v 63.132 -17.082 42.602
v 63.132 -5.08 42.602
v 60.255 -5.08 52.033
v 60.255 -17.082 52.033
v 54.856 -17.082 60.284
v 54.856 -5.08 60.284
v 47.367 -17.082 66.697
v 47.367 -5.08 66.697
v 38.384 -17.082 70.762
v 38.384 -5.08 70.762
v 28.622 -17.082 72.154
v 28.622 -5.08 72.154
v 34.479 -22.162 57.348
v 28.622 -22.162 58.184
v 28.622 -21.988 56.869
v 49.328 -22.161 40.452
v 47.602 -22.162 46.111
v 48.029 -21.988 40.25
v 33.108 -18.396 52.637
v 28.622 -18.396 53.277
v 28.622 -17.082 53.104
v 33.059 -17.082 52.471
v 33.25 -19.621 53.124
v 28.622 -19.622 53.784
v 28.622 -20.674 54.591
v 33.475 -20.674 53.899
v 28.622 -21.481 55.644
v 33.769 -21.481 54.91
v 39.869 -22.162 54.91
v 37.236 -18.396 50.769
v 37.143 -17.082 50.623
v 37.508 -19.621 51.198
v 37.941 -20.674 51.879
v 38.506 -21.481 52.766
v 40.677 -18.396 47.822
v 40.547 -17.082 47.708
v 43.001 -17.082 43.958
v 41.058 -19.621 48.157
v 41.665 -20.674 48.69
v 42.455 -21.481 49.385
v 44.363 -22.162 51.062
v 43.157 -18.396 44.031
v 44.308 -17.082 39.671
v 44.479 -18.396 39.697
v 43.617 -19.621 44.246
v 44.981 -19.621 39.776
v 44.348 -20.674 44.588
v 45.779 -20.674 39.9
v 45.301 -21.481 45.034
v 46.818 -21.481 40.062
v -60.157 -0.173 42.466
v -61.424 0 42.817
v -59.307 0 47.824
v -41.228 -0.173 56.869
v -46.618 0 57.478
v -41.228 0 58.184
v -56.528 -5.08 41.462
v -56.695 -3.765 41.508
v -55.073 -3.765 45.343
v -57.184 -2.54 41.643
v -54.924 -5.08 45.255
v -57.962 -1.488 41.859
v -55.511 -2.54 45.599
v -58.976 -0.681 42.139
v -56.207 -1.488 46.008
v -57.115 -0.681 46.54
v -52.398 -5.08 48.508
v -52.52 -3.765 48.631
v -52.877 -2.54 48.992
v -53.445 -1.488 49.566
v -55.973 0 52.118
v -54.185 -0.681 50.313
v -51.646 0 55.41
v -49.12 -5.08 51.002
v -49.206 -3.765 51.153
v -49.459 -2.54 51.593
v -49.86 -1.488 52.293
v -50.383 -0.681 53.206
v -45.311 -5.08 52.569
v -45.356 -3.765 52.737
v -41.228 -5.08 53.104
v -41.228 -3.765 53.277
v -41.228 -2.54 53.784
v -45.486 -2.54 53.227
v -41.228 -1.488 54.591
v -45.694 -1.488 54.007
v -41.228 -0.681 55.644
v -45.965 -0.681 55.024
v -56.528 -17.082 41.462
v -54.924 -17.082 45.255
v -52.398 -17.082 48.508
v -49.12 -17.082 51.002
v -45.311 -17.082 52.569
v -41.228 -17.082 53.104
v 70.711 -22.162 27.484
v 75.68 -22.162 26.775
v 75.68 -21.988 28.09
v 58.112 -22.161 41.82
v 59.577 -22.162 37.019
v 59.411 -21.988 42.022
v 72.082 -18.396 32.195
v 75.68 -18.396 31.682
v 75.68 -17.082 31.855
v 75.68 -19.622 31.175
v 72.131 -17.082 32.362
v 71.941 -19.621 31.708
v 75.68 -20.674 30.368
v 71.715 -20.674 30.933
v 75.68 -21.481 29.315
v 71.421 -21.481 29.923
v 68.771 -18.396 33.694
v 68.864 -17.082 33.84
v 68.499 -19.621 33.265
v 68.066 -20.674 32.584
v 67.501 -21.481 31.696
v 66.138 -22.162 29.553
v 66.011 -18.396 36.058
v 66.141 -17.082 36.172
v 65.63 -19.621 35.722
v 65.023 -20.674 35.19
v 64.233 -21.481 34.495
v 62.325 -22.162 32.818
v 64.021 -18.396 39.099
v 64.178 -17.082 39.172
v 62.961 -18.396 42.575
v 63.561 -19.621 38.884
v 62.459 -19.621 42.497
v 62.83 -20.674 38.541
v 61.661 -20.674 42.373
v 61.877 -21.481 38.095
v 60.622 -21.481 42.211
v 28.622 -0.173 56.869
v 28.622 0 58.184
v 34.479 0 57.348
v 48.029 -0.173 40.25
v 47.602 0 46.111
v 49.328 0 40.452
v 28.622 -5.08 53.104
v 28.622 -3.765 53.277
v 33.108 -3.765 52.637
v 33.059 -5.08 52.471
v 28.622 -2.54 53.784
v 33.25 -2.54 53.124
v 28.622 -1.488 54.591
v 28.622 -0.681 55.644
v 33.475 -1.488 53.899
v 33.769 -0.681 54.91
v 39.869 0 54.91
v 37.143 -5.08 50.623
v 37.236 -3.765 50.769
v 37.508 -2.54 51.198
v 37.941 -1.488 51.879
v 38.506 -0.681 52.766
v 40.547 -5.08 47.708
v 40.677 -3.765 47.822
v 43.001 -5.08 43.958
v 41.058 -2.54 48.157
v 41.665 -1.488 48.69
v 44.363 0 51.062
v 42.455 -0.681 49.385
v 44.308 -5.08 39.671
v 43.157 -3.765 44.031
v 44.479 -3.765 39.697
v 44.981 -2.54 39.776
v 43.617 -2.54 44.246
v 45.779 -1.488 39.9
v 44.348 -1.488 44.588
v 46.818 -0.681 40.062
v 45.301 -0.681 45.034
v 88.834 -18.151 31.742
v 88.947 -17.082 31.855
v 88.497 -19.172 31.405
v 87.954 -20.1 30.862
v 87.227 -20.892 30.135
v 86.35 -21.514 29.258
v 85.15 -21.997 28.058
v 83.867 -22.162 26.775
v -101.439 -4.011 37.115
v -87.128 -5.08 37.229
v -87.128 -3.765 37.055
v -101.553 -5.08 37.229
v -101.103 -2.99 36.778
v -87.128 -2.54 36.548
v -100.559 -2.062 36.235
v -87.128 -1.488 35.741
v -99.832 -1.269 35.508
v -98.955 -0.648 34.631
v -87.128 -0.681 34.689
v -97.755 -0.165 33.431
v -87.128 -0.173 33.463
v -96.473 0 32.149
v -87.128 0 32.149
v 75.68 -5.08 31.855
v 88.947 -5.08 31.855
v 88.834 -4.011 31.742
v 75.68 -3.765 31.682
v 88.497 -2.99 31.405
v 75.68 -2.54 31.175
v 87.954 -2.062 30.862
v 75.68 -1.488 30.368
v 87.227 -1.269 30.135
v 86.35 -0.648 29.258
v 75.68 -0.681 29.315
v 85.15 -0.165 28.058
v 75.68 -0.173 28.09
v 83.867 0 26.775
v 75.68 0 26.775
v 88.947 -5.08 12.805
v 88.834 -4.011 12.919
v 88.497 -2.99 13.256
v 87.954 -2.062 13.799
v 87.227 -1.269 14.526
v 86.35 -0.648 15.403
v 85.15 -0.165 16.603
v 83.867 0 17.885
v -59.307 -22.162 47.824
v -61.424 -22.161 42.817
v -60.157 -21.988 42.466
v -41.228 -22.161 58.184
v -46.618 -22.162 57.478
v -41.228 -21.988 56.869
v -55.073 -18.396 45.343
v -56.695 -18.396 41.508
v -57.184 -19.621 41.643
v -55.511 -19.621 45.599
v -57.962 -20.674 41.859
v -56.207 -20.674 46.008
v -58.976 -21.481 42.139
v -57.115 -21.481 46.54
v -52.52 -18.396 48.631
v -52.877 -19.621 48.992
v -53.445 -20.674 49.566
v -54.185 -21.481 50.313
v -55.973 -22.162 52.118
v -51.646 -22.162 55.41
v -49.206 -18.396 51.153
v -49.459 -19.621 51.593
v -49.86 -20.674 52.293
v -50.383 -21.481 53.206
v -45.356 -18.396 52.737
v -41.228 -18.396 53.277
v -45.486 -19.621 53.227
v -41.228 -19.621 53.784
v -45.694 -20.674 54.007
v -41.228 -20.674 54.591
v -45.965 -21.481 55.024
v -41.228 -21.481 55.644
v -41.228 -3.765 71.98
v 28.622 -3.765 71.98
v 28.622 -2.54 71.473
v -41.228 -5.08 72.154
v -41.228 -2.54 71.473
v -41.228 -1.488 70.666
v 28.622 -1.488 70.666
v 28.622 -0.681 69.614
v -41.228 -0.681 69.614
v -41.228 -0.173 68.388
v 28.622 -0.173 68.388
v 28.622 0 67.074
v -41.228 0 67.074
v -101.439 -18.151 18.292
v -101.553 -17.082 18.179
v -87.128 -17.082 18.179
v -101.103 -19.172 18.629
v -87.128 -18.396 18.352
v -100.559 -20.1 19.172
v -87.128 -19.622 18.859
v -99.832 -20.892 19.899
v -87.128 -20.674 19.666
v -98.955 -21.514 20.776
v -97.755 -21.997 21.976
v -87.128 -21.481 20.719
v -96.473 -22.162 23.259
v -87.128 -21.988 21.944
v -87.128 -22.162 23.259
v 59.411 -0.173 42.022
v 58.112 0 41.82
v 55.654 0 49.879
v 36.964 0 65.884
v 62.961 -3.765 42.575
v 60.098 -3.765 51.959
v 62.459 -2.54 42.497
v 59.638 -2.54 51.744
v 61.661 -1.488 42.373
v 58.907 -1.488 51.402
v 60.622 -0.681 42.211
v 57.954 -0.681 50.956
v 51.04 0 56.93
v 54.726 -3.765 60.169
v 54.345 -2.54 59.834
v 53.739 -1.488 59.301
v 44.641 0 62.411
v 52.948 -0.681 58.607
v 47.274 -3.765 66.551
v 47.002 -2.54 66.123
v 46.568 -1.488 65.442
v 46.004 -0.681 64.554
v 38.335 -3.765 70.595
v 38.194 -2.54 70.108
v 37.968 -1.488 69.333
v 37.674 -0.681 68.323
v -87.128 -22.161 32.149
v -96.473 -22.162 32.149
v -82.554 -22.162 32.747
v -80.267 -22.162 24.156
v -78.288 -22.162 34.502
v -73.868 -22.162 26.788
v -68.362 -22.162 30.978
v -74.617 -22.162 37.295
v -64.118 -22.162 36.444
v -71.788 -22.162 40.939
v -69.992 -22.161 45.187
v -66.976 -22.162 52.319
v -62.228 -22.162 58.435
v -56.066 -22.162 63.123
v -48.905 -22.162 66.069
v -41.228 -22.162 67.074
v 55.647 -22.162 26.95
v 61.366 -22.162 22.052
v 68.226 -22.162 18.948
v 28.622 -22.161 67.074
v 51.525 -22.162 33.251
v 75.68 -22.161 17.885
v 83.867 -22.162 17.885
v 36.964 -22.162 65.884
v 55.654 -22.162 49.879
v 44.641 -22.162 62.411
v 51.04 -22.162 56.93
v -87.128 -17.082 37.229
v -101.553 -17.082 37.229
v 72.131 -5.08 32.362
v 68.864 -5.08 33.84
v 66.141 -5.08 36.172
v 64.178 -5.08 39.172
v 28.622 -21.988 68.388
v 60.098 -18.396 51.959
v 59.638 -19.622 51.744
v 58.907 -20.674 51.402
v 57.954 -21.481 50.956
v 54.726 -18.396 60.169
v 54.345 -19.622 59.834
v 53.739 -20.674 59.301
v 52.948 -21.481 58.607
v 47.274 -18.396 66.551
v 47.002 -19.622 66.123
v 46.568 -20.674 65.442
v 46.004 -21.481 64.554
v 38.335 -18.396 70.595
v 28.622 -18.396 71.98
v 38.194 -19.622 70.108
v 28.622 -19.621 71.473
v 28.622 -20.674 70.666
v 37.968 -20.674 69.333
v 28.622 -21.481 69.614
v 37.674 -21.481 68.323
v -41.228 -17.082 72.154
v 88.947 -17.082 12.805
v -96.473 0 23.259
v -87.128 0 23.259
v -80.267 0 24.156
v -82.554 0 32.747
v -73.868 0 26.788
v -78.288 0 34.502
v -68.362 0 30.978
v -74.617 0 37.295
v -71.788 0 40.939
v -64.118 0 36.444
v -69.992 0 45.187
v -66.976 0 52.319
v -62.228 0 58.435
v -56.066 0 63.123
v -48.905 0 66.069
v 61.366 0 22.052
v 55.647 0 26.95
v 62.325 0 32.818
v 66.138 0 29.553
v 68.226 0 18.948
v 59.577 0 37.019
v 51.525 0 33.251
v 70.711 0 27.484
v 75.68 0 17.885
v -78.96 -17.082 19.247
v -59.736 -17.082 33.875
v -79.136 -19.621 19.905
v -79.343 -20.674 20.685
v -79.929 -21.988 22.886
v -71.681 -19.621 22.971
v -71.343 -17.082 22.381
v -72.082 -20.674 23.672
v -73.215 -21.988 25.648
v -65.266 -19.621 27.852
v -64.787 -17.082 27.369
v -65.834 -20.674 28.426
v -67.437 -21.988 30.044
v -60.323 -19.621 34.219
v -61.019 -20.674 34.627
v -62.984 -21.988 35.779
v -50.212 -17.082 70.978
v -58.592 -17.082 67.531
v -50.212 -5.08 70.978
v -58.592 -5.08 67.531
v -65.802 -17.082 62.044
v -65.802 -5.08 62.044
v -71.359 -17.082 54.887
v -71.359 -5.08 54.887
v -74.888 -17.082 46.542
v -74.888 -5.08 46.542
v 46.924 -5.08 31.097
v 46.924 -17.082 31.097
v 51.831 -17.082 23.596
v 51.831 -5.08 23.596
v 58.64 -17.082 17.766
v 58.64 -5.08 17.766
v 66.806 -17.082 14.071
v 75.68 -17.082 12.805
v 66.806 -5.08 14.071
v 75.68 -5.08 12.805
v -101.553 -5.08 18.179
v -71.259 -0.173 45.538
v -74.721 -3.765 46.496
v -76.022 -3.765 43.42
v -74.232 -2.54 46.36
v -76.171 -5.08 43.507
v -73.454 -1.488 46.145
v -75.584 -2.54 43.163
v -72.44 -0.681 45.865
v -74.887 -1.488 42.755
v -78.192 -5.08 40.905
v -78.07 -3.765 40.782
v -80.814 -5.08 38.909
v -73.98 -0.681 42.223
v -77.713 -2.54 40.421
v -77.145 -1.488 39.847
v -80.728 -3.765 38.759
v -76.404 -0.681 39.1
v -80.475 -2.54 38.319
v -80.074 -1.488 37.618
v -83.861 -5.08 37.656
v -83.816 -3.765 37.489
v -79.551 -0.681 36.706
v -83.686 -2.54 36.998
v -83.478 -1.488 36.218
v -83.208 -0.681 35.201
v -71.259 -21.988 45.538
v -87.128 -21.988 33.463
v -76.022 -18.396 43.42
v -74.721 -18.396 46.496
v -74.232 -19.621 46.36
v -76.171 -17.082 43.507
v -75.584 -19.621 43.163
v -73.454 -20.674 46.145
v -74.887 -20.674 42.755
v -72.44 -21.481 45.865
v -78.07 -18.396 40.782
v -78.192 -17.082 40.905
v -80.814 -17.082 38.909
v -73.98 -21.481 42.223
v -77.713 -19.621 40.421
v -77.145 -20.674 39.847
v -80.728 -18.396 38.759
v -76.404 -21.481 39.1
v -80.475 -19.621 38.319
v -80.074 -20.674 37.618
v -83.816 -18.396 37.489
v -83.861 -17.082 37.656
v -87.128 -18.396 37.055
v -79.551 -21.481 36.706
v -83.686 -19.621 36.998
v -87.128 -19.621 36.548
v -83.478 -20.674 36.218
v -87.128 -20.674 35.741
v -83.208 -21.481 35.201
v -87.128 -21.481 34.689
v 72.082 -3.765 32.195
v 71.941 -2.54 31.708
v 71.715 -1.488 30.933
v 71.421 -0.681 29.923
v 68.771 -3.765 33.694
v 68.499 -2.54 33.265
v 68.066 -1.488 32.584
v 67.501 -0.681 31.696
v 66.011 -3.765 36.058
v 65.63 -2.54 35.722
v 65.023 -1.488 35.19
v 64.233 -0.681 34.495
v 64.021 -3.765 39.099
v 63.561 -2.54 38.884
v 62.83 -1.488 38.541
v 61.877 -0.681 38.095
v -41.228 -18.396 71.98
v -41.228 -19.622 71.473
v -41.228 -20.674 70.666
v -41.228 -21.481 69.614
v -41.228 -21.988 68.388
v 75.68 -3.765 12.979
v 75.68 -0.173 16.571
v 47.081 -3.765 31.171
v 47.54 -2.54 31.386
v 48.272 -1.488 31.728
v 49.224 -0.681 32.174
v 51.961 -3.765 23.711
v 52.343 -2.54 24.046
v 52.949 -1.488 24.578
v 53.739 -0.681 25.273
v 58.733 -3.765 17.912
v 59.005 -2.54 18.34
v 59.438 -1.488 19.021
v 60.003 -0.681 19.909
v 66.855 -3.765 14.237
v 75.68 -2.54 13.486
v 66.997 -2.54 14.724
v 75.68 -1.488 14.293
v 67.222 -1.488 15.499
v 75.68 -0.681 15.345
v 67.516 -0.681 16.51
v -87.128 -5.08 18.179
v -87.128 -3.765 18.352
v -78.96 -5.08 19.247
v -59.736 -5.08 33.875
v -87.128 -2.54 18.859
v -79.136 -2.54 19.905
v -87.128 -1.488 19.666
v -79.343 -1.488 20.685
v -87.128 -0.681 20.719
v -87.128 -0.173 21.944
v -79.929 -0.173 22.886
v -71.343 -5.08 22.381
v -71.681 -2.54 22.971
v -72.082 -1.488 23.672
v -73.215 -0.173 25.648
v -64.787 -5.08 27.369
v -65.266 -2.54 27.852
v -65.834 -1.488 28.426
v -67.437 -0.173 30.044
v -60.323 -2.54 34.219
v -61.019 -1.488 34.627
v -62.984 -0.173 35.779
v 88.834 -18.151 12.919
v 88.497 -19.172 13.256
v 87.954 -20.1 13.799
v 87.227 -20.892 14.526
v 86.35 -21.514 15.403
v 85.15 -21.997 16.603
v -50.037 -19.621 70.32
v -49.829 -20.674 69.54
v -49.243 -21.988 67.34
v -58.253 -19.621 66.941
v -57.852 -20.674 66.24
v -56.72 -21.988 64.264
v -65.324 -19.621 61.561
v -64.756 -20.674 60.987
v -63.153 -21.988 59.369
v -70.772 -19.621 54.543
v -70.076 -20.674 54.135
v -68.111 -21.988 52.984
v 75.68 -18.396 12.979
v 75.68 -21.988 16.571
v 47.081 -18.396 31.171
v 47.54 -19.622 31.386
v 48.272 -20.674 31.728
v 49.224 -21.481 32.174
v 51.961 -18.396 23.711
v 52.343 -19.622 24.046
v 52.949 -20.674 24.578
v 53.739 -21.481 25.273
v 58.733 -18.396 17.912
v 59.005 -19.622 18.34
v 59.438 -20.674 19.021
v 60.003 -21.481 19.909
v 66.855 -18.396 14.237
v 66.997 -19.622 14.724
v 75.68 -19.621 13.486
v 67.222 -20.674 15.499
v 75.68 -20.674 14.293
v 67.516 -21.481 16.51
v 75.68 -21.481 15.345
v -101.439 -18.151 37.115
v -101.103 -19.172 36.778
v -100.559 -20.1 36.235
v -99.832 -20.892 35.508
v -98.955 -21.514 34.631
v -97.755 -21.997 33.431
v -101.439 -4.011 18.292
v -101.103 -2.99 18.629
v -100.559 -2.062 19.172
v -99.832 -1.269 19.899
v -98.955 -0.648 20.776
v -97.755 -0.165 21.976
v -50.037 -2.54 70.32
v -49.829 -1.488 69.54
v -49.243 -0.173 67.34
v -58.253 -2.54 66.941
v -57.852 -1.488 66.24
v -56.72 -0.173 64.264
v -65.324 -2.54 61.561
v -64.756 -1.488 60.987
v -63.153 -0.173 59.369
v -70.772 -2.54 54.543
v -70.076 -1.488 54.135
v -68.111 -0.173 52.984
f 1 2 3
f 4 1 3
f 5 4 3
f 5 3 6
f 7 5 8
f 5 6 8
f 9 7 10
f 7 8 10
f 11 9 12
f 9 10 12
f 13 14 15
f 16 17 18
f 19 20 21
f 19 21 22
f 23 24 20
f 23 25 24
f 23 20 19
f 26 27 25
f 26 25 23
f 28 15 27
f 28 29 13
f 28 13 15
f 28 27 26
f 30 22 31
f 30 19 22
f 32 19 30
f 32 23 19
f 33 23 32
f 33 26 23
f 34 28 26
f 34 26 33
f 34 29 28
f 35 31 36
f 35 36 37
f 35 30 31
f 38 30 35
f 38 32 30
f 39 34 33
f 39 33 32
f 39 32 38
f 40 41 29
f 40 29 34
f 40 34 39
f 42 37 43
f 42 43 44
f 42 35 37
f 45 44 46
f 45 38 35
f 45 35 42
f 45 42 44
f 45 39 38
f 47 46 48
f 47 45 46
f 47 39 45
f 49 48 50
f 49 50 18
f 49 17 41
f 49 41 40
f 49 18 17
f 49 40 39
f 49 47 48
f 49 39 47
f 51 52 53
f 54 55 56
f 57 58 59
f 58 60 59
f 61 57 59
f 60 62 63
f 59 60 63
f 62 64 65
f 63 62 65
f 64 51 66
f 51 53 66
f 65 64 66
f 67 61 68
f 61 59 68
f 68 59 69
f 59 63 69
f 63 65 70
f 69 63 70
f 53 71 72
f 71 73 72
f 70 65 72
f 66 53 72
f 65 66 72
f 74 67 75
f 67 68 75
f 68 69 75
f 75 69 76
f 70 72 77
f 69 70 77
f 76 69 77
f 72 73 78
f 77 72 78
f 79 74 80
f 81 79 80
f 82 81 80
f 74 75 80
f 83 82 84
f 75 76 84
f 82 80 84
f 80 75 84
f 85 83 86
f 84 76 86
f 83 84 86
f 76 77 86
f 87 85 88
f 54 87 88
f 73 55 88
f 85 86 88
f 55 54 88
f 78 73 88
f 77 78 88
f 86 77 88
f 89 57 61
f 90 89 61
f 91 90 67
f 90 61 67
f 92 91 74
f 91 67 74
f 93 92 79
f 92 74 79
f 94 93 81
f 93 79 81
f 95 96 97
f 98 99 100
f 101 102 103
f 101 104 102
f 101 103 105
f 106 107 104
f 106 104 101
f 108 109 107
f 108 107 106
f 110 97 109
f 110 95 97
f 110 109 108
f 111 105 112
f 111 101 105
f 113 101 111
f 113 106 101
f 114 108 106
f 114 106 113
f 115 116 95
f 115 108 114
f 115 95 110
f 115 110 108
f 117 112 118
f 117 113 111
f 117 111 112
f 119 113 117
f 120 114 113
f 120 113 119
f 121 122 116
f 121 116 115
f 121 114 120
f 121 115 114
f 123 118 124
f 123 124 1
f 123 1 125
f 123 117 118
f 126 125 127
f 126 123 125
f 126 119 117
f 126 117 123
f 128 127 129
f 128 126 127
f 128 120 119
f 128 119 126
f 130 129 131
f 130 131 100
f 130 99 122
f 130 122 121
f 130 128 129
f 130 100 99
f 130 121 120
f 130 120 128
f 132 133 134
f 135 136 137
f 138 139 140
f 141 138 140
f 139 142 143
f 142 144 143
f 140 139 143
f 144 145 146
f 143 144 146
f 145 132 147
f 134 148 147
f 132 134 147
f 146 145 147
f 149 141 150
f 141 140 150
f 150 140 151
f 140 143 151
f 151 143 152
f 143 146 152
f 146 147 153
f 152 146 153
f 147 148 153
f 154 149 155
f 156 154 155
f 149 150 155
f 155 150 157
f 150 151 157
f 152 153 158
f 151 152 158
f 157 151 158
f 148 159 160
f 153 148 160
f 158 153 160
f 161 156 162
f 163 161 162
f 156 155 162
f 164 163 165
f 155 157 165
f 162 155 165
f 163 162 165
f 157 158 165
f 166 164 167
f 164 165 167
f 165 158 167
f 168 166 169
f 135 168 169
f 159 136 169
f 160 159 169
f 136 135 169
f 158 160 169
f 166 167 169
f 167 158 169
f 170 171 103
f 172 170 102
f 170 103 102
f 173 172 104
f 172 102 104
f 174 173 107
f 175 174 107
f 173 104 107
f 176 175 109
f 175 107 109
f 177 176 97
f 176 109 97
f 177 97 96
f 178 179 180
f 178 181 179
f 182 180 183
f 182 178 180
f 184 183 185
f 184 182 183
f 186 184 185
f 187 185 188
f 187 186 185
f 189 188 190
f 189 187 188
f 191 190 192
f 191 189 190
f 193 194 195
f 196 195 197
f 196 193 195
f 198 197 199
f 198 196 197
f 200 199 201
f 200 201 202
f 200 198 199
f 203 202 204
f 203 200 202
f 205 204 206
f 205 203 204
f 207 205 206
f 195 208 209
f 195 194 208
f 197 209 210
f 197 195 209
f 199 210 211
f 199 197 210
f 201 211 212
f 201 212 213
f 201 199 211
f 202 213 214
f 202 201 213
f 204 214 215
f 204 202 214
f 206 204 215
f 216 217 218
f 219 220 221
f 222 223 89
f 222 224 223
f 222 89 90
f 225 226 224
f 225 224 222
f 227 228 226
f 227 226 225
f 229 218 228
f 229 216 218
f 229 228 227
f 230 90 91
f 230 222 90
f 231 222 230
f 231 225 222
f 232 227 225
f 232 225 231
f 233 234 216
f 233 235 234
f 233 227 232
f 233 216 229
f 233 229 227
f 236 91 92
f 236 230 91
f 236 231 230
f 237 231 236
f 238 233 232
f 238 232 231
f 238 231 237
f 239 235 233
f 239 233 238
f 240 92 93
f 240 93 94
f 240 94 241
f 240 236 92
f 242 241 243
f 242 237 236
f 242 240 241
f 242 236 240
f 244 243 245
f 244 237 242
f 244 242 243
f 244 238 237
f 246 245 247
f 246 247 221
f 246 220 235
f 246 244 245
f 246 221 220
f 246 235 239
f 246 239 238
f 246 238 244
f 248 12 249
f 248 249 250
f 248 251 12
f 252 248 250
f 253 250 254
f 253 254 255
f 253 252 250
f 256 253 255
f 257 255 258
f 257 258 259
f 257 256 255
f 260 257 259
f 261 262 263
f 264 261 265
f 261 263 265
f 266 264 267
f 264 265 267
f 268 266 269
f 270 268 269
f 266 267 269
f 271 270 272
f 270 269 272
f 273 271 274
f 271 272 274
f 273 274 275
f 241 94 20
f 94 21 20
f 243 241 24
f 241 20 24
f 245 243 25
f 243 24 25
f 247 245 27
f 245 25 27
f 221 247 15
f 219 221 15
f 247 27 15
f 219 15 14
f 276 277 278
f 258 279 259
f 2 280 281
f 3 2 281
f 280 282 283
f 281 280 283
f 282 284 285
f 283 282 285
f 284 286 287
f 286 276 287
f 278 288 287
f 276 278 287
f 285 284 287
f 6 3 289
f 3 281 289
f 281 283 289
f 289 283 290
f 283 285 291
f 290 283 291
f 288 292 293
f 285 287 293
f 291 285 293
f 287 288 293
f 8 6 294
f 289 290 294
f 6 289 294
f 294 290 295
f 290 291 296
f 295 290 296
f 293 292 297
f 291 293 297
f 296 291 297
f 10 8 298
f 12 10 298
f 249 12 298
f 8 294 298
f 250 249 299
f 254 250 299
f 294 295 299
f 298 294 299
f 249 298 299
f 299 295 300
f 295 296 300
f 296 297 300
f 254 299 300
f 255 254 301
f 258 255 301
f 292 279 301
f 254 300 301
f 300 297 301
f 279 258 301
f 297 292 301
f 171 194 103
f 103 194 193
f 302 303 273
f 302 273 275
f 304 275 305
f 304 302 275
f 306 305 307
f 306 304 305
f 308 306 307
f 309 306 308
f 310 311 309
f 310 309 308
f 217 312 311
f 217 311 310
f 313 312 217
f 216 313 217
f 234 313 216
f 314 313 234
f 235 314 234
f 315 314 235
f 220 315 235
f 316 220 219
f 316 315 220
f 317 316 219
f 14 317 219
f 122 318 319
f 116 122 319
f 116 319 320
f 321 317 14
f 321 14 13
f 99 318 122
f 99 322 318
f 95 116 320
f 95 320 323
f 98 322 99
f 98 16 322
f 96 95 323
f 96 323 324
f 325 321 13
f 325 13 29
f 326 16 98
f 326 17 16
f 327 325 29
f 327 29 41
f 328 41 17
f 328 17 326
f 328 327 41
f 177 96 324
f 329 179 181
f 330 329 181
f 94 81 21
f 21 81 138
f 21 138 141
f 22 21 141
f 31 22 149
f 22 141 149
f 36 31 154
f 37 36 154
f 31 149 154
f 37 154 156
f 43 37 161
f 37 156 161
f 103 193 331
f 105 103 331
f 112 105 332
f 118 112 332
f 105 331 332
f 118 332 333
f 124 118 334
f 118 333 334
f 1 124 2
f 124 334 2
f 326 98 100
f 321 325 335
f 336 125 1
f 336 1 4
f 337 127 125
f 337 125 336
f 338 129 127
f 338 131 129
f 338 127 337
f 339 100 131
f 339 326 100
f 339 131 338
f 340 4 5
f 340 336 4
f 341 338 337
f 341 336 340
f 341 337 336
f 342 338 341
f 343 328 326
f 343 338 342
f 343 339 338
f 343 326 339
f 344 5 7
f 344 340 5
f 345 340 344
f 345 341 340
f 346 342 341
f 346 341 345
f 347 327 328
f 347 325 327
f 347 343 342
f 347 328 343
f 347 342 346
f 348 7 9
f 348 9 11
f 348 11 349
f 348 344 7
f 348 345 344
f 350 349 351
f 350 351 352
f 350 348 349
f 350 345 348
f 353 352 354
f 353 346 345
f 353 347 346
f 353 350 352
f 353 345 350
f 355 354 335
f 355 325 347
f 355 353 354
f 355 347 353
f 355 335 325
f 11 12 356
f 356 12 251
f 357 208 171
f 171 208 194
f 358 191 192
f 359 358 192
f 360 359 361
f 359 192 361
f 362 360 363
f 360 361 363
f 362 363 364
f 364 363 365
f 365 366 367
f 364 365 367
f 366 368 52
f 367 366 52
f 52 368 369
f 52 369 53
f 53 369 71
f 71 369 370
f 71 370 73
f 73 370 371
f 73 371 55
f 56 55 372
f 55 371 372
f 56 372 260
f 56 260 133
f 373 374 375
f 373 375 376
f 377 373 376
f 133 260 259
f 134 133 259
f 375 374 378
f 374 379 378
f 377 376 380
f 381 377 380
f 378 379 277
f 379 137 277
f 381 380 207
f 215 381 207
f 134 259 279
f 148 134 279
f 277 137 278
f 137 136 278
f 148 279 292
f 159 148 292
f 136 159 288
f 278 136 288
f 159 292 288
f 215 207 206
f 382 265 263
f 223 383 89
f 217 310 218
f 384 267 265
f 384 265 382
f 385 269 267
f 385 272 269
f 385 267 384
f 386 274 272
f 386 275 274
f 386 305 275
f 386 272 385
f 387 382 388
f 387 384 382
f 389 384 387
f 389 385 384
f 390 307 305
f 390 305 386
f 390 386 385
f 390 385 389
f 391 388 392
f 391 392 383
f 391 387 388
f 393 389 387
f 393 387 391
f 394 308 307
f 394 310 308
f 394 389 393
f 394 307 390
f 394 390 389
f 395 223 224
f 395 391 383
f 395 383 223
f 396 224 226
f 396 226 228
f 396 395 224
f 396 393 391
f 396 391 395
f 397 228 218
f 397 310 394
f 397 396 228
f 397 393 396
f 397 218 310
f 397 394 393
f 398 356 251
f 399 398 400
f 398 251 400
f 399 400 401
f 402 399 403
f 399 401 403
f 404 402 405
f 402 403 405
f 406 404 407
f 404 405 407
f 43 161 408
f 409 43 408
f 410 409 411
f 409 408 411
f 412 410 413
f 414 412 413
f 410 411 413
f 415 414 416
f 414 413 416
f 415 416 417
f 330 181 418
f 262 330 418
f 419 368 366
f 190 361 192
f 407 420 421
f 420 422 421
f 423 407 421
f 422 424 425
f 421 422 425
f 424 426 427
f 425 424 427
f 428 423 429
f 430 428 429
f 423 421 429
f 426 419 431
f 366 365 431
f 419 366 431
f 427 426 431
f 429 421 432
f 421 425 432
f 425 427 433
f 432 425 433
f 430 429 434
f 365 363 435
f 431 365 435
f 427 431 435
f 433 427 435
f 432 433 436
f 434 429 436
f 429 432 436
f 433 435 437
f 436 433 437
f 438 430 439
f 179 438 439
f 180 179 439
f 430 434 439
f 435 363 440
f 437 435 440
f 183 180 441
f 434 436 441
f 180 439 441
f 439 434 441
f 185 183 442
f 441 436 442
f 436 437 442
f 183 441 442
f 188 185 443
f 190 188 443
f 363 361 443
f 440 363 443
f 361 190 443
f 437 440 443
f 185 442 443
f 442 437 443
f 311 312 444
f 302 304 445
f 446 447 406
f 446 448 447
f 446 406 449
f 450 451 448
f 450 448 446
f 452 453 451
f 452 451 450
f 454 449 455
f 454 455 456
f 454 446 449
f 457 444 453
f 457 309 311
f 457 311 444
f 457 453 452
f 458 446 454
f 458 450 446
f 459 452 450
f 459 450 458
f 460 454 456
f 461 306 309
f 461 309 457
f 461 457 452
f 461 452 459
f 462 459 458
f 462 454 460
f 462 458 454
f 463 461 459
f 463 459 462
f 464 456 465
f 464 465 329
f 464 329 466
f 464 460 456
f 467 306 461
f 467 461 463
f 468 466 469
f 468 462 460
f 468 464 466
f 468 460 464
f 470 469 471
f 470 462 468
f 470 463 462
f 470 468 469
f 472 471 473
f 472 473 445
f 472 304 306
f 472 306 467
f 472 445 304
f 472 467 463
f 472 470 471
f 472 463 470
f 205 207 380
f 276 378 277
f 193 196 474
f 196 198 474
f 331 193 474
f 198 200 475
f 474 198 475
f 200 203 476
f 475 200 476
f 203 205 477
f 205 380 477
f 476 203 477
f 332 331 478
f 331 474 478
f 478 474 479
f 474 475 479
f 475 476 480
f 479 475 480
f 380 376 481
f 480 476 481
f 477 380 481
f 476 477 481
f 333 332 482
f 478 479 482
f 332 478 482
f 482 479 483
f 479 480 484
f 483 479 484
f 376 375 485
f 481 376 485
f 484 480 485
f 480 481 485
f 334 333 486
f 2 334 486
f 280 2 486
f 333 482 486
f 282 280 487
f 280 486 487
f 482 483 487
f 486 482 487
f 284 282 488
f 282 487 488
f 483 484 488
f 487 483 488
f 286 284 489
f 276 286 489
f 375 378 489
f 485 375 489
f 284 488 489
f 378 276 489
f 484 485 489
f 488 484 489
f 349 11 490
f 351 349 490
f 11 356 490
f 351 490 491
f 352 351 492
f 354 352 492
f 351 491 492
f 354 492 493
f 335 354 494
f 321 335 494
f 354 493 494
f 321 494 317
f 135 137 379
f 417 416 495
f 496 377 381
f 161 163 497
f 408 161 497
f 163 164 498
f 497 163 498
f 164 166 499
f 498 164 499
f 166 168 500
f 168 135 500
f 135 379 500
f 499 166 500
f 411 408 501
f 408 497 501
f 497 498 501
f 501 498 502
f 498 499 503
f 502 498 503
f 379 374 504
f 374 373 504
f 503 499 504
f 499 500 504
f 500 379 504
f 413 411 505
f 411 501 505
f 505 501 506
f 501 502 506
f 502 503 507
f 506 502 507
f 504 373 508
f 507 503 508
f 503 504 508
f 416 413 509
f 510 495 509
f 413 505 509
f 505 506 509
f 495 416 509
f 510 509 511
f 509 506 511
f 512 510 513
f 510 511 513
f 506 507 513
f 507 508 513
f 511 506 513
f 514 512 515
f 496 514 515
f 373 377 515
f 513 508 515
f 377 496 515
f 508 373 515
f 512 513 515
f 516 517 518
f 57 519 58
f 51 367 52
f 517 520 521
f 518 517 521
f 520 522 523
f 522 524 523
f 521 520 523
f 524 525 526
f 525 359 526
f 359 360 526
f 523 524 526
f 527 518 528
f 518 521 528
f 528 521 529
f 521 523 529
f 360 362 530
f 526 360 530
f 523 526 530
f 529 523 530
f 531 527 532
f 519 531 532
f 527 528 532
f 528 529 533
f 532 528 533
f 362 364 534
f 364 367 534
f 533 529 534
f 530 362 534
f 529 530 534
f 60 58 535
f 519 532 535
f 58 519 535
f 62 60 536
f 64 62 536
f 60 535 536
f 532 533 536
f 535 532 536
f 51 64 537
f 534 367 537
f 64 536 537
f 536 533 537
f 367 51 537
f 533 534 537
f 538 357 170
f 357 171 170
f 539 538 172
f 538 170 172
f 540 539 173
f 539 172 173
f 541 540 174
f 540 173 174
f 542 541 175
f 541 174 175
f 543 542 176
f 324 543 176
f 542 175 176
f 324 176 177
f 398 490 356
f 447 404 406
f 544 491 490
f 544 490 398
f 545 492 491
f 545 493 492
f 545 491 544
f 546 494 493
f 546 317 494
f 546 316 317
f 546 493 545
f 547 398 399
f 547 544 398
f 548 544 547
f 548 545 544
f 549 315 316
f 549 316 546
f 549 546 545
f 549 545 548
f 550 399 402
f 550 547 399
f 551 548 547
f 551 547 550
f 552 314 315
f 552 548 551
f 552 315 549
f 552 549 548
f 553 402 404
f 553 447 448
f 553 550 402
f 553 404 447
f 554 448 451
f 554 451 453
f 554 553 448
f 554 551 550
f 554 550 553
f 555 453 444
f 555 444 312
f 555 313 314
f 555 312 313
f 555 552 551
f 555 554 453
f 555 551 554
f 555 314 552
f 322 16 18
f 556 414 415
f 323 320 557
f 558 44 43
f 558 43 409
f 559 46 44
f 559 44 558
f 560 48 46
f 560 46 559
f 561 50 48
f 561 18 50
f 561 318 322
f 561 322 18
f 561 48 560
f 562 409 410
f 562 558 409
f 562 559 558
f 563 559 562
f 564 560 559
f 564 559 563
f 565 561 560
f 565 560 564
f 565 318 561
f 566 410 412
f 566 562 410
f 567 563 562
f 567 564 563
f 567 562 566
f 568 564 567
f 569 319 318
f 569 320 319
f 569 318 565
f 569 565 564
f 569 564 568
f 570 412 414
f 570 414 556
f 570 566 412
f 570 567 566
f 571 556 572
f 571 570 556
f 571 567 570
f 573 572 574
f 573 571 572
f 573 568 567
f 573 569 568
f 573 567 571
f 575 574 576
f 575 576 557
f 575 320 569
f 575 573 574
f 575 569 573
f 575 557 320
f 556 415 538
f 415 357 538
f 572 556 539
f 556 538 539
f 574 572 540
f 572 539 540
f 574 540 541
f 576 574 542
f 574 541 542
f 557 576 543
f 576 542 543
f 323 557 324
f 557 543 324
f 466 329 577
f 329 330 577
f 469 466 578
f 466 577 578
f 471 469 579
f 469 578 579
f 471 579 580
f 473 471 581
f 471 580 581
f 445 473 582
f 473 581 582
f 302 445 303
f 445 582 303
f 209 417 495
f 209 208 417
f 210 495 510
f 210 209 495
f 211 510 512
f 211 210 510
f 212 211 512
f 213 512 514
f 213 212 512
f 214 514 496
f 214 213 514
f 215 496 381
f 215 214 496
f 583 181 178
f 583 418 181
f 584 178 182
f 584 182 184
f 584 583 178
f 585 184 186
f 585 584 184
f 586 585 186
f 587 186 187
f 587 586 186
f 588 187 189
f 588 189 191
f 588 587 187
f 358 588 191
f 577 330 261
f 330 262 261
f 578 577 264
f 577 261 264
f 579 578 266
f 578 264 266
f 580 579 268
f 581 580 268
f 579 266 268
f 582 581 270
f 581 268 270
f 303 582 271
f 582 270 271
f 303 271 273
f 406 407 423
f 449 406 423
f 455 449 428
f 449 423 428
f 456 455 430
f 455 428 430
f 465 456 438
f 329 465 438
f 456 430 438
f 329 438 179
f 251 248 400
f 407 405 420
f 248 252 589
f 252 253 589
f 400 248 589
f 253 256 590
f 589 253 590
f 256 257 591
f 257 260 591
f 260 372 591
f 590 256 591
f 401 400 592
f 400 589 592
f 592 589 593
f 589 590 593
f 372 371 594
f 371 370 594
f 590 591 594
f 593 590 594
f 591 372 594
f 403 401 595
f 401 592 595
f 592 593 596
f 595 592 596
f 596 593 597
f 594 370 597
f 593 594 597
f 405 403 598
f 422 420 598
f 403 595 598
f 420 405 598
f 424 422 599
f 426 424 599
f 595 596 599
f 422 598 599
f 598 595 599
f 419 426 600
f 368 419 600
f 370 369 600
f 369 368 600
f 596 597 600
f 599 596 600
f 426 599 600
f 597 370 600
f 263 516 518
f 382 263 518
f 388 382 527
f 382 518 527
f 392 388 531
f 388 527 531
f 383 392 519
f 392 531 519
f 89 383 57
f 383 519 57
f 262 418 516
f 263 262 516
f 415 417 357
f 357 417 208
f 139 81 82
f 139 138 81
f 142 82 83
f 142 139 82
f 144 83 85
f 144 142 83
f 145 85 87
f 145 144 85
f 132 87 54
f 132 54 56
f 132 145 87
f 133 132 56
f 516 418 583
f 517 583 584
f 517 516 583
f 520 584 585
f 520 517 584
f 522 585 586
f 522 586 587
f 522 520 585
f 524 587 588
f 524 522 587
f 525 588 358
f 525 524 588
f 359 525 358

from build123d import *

# Parameters (mm, degrees)
F1_DEPTH = 22.1615
F2_R     = 5.08


# Not quite as in the source:
# - a feature names something its author has since deleted; it is built from what else it names


with BuildPart() as f1:
    # F0 (on Front) → F1 (new body)
    with BuildSketch(Plane.XZ):
        with BuildLine():
            Line((28.6224108991, 72.15352447), (-41.2275891009, 72.15352447))
            ThreePointArc((-41.2275891009, 72.15352447), (-62.3757268242, 65.0226226894), (-74.8879136272, 46.5418578033))
            ThreePointArc((-74.8879136272, 46.5418578033), (-79.4377997374, 39.8215796629), (-87.1280316368, 37.22852447))
            Line((-87.1280316368, 37.22852447), (-101.5525891009, 37.22852447))
            Line((-101.5525891009, 37.22852447), (-101.5525891009, 18.17852447))
            Line((-101.5525891009, 18.17852447), (-87.1280316368, 18.17852447))
            ThreePointArc((-87.1280316368, 18.17852447), (-67.9024518883, 24.6611624523), (-56.5277366129, 41.4618578033))
            ThreePointArc((-56.5277366129, 41.4618578033), (-50.8403789751, 49.8622054788), (-41.2275891009, 53.10352447))
            Line((-41.2275891009, 53.10352447), (28.6224108991, 53.10352447))
            ThreePointArc((28.6224108991, 53.10352447), (38.9482036141, 49.2864525593), (44.3084160673, 39.6708321623))
            ThreePointArc((44.3084160673, 39.6708321623), (55.0288409738, 20.4395913682), (75.6804264037, 12.8054475469))
            Line((75.6804264037, 12.8054475469), (88.9474108991, 12.8054475469))
            Line((88.9474108991, 12.8054475469), (88.9474108991, 31.8554475469))
            Line((88.9474108991, 31.8554475469), (75.6804264037, 31.8554475469))
            ThreePointArc((75.6804264037, 31.8554475469), (67.4197922317, 34.9091050754), (63.1316222691, 42.601601393))
            ThreePointArc((63.1316222691, 42.601601393), (51.3391548721, 63.7559662665), (28.6224108991, 72.15352447))
        make_face()
    extrude(amount=F1_DEPTH)

    # F2
    f2_edges = [f1.edges().sort_by_distance(p)[0] for p in [
        (88.947411, -22.1615, 22.330448),
        (82.313919, -22.1615, 31.855448),
        (67.419792, -22.1615, 34.909105),
        (51.339155, -22.1615, 63.755966),
        (-6.302589, -22.1615, 72.153524),
        (-62.375727, -22.1615, 65.022623),
        (-79.4378, -22.1615, 39.82158),
        (-94.34031, -22.1615, 37.228524),
        (-101.552589, -22.1615, 27.703524),
        (-94.34031, -22.1615, 18.178524),
        (-67.902452, -22.1615, 24.661162),
        (-50.840379, -22.1615, 49.862205),
        (-6.302589, -22.1615, 53.103524),
        (38.948204, -22.1615, 49.286453),
        (55.028841, -22.1615, 20.439591),
        (82.313919, -22.1615, 12.805448),
        (88.947411, 0, 22.330448),
        (82.313919, 0, 31.855448),
        (67.419792, 0, 34.909105),
        (51.339155, 0, 63.755966),
        (-6.302589, 0, 72.153524),
        (-62.375727, 0, 65.022623),
        (-79.4378, 0, 39.82158),
        (-94.34031, 0, 37.228524),
        (-101.552589, 0, 27.703524),
        (-94.34031, 0, 18.178524),
        (-67.902452, 0, 24.661162),
        (-50.840379, 0, 49.862205),
        (-6.302589, 0, 53.103524),
        (38.948204, 0, 49.286453),
        (55.028841, 0, 20.439591),
        (82.313919, 0, 12.805448),
    ]]
    fillet(f2_edges, radius=F2_R)


solid = f1.part
